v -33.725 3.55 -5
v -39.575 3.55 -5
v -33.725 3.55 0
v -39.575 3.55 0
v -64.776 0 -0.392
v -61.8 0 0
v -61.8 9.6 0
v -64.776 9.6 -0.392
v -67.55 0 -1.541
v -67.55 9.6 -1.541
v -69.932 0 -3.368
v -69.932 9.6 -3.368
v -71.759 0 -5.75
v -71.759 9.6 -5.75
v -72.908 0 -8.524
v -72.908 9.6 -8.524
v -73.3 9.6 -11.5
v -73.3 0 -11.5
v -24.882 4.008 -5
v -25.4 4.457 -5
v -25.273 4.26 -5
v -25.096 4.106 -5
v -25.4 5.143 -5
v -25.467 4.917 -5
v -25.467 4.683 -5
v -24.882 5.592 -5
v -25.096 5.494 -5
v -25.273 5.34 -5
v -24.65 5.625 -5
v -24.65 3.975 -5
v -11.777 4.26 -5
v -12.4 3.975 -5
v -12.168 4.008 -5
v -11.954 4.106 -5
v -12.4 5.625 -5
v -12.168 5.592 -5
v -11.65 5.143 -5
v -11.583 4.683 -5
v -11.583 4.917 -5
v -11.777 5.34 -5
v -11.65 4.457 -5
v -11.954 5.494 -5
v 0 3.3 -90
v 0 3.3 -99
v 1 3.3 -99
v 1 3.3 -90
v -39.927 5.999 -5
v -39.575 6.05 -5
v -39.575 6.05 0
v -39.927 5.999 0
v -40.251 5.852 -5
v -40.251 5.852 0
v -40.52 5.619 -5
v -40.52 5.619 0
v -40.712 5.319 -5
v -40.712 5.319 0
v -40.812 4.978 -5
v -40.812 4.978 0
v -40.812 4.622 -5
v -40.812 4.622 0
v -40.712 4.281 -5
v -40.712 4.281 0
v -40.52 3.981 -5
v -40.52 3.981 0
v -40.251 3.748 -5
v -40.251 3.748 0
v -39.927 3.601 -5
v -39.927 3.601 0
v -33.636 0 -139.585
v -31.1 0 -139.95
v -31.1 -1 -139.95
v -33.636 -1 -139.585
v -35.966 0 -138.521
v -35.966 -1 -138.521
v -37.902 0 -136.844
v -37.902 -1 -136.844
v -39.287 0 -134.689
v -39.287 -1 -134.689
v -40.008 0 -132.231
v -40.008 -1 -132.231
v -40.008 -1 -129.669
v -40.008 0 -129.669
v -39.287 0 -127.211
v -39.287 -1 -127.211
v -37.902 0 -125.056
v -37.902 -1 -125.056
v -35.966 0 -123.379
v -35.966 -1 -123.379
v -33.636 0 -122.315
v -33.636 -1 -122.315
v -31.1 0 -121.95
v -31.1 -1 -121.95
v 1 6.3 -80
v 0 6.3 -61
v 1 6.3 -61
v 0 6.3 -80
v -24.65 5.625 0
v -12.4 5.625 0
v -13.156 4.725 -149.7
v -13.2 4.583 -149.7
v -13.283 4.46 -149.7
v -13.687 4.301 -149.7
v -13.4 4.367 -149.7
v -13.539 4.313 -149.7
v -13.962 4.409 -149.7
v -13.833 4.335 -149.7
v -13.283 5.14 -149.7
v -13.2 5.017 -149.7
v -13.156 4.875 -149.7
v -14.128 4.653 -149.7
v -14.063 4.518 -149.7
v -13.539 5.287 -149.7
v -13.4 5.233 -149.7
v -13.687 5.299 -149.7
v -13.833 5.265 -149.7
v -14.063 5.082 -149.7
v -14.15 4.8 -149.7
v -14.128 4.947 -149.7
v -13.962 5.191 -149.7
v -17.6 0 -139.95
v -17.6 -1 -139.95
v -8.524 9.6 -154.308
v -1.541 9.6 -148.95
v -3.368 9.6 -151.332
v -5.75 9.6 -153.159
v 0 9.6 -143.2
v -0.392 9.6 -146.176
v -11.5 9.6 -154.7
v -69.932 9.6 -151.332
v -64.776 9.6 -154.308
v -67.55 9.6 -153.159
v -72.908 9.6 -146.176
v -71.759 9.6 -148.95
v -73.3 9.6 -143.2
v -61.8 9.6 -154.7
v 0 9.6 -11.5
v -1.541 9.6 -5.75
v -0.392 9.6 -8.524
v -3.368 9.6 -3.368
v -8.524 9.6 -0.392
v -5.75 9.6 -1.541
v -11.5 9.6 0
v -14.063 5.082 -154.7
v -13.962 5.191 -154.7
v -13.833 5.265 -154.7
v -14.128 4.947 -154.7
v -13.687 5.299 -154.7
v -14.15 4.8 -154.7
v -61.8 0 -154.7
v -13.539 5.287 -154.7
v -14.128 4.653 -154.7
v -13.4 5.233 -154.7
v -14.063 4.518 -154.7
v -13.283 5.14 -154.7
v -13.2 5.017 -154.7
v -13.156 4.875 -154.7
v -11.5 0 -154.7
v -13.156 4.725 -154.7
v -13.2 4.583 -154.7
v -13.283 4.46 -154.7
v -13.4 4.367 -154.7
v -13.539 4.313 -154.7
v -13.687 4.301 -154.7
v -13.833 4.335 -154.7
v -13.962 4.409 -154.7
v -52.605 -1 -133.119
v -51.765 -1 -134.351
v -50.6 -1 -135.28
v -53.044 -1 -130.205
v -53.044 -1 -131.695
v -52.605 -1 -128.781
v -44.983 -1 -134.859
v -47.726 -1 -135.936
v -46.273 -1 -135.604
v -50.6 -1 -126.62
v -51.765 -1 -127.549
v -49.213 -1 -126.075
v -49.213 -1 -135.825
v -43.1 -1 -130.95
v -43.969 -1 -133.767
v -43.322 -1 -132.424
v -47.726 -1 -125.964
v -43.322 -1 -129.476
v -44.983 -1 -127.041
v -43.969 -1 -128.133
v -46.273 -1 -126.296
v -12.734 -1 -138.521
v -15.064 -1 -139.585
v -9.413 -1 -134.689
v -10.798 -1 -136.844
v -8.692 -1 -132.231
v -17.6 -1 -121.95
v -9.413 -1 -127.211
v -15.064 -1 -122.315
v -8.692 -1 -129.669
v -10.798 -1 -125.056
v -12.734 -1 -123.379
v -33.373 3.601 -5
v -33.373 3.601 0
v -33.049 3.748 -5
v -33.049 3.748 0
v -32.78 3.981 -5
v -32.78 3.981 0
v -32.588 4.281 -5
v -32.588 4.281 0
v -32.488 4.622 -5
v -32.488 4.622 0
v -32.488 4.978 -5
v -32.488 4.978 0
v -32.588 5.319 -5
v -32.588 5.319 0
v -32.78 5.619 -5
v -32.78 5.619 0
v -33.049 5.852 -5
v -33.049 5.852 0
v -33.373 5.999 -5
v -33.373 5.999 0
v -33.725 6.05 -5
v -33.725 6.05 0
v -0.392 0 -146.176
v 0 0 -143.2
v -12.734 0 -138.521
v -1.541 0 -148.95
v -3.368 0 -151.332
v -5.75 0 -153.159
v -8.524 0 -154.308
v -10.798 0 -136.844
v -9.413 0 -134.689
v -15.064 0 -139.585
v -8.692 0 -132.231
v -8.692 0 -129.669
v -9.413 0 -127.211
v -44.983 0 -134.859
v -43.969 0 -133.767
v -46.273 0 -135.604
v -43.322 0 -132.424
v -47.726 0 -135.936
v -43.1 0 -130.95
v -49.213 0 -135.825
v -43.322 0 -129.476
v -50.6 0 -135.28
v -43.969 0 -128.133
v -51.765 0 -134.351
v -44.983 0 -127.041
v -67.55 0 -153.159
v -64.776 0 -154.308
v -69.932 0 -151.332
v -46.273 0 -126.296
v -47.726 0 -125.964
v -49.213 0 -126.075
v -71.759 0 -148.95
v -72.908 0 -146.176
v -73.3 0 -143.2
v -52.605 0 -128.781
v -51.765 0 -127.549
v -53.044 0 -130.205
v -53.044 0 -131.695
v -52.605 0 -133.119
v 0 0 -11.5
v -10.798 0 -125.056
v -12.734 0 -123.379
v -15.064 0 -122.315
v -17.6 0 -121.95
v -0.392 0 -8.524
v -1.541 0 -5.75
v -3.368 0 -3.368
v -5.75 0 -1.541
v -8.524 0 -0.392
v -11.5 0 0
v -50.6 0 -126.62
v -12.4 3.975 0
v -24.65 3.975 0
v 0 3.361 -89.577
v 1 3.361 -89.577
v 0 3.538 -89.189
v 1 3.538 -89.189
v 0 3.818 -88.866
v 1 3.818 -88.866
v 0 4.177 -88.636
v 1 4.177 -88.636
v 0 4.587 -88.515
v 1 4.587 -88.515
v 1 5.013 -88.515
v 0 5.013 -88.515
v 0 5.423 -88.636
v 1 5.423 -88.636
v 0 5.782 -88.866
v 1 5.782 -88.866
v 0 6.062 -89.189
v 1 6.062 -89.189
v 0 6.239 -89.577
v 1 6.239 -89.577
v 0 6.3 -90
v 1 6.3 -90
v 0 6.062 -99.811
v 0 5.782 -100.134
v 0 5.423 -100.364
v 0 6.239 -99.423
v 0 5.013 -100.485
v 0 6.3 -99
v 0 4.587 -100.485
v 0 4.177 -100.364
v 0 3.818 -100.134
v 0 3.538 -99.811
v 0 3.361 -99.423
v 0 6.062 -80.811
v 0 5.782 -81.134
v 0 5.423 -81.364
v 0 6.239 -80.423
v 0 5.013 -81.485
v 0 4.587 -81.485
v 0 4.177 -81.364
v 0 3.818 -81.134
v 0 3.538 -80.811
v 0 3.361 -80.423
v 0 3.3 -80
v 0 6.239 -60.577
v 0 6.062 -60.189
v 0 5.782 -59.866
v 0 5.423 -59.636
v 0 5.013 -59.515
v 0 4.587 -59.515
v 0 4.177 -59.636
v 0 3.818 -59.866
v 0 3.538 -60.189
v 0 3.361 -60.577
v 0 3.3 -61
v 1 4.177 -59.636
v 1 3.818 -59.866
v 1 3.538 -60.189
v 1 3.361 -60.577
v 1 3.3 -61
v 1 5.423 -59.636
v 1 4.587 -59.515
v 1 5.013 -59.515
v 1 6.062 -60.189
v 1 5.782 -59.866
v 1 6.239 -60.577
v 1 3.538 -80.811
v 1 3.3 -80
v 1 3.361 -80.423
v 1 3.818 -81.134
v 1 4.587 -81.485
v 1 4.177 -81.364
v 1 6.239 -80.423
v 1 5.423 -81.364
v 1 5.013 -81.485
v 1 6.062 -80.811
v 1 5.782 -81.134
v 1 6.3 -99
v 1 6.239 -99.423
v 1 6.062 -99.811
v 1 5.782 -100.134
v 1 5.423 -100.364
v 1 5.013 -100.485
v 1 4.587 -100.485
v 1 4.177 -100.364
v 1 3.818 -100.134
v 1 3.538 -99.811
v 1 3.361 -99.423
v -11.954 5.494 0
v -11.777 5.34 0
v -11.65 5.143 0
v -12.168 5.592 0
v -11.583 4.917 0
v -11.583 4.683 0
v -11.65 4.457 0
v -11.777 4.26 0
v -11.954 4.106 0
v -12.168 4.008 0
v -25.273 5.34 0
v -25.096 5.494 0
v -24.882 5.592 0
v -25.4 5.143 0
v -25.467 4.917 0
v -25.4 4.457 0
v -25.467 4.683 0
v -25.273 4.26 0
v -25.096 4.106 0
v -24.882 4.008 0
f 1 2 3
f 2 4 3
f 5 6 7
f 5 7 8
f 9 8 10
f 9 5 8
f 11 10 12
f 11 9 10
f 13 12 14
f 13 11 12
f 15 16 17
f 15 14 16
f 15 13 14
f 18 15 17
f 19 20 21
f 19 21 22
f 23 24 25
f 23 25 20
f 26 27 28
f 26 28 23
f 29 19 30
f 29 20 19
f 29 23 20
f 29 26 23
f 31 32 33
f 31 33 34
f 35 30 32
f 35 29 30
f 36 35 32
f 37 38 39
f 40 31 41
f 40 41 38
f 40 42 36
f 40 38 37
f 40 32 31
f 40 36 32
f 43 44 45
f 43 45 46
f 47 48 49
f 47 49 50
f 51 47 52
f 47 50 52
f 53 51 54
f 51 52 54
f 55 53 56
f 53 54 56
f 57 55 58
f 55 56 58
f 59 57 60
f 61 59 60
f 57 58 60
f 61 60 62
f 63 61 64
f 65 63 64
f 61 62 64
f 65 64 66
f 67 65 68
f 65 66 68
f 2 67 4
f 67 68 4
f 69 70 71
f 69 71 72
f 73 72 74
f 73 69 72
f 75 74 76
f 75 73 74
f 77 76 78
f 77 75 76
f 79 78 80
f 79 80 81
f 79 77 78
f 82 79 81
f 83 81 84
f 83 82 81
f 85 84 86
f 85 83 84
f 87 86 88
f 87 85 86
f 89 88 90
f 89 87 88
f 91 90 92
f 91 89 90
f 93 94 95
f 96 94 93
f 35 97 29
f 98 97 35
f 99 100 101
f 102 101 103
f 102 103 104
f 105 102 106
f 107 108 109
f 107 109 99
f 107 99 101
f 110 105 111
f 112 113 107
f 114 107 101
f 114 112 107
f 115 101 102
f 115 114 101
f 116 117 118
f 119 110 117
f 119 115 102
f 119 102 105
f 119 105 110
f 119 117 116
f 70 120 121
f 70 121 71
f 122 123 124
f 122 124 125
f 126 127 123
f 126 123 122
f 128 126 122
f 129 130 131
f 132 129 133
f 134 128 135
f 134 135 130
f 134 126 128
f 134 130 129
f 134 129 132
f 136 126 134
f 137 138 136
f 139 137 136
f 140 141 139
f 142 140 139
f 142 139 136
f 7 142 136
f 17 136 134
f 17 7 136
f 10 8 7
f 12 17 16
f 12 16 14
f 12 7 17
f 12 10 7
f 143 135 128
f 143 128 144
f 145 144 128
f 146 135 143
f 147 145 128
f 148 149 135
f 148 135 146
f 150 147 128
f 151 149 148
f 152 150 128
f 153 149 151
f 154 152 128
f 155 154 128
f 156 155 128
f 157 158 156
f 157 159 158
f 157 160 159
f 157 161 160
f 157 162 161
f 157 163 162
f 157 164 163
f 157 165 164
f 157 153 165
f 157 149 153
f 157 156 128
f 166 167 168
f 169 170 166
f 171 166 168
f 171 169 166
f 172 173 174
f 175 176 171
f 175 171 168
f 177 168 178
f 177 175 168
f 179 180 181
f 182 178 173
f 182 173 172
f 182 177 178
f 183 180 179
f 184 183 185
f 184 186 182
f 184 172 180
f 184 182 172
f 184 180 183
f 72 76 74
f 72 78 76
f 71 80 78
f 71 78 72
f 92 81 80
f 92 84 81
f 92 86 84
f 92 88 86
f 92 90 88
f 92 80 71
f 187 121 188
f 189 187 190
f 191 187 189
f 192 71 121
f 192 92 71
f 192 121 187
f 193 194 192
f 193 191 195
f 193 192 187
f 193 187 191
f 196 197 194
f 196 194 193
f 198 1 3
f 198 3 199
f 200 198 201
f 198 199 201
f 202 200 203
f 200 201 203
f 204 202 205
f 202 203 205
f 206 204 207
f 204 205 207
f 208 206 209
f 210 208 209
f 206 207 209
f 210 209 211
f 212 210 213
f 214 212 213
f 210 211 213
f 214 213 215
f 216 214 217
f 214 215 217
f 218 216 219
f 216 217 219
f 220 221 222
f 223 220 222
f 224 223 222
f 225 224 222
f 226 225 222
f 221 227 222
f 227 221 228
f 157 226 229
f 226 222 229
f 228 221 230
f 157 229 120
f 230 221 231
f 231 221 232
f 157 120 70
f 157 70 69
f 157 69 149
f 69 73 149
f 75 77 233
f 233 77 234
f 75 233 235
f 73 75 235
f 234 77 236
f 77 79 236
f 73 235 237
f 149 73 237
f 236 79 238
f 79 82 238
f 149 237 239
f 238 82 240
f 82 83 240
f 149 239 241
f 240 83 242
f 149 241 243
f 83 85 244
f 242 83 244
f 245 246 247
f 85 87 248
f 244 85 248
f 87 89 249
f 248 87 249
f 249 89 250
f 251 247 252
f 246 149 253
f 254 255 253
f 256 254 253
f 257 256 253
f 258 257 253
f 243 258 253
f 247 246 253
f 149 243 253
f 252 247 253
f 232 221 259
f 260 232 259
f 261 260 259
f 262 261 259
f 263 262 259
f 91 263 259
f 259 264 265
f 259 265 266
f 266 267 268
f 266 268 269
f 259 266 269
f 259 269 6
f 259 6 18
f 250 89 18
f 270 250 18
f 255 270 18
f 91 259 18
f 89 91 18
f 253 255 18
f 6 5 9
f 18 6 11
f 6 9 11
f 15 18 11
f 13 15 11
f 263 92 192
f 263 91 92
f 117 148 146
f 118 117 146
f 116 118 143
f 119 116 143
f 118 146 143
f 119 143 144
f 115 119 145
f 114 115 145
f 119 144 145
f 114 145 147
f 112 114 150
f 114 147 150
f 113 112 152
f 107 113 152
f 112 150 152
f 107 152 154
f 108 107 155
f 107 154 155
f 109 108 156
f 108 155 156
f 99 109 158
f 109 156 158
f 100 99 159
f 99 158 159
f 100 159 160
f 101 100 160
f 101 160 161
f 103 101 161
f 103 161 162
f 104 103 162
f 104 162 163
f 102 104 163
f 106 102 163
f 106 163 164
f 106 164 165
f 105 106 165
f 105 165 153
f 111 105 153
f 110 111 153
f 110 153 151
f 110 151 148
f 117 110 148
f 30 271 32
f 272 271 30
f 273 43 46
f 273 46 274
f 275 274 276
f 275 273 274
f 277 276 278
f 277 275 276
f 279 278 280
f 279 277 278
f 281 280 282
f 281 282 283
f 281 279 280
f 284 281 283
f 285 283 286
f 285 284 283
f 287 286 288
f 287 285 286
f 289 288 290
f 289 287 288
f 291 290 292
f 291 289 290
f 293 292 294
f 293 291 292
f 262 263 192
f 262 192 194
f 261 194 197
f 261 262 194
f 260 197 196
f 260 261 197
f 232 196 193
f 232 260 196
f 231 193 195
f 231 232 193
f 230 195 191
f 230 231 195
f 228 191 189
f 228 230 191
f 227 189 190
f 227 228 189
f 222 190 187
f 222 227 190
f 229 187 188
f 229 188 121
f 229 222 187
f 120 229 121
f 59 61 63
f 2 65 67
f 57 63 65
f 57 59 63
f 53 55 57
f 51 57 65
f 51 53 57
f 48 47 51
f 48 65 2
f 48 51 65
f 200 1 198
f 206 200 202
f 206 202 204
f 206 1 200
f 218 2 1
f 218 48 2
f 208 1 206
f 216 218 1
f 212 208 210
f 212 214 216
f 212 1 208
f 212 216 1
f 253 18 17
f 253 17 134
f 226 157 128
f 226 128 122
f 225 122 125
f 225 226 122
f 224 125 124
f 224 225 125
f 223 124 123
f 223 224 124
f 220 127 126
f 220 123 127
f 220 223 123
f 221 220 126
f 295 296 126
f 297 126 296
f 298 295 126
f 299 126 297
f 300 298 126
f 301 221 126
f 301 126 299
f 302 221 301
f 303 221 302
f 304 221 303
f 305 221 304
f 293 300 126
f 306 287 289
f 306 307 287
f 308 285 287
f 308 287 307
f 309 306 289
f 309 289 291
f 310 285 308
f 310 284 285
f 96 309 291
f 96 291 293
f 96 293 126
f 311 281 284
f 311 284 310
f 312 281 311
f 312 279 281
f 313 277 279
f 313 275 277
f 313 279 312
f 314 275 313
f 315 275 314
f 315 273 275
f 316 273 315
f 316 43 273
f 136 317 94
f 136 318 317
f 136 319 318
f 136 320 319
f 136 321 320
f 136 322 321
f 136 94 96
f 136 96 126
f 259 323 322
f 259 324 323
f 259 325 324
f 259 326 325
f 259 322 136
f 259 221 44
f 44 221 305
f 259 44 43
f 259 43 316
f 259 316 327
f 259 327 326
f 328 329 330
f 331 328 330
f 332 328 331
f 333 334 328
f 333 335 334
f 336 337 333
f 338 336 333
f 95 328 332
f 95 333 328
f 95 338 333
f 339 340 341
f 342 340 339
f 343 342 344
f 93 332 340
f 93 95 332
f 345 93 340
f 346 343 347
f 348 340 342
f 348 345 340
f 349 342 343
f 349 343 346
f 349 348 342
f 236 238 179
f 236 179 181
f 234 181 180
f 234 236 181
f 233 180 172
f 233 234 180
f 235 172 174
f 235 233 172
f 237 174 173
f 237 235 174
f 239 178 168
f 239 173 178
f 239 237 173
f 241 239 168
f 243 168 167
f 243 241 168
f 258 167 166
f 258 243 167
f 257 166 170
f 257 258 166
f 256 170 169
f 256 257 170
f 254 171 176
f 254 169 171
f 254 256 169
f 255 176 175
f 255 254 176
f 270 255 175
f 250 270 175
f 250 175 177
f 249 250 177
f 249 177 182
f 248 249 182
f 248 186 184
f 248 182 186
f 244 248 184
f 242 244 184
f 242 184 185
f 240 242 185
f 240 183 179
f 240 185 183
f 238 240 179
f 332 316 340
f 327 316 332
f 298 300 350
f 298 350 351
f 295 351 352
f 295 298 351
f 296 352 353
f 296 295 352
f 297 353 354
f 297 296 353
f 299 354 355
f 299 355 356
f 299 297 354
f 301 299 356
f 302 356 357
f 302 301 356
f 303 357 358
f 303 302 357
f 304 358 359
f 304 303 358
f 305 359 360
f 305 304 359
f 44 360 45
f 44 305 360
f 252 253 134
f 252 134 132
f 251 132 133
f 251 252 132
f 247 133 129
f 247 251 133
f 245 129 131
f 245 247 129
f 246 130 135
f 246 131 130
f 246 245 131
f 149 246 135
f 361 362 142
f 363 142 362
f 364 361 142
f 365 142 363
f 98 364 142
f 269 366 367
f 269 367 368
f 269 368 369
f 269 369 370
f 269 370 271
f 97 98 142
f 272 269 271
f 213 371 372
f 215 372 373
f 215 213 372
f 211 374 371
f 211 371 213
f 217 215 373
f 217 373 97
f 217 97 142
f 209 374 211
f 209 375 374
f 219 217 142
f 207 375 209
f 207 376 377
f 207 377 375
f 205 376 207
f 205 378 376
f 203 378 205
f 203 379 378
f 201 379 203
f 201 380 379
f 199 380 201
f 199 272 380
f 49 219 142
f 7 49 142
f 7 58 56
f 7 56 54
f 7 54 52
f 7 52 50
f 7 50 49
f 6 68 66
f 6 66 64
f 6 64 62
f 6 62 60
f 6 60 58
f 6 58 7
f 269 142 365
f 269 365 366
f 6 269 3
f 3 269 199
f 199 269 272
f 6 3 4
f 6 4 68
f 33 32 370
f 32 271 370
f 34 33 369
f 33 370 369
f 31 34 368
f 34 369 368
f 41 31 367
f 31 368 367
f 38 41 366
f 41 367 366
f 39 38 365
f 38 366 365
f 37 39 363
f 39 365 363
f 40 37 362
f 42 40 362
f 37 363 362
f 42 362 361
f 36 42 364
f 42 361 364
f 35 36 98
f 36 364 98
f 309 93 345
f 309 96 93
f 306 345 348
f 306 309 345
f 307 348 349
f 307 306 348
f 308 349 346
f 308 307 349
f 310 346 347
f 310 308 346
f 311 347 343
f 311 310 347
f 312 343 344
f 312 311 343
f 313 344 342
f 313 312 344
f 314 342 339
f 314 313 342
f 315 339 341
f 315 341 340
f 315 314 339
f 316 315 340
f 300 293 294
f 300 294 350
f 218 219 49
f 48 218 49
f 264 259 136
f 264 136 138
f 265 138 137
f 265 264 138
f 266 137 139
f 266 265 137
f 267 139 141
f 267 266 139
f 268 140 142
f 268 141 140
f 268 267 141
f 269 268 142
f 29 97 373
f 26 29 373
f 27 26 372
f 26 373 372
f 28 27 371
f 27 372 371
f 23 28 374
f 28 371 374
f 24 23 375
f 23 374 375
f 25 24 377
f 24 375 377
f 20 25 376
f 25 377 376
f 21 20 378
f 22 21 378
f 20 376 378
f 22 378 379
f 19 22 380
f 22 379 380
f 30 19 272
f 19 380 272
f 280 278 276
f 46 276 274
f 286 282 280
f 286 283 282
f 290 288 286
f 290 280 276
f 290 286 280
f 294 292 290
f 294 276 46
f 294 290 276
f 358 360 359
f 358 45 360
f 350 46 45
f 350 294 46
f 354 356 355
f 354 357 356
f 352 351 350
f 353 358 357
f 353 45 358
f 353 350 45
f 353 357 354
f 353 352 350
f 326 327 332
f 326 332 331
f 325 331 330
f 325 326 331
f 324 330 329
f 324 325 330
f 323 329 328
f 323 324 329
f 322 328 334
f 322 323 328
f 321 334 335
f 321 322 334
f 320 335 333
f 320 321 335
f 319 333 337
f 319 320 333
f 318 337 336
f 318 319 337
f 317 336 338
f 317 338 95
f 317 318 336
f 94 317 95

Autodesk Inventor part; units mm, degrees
ref_plane "YZ Plane" through (0, 0, 0) normal (1, 0, 0) x (0, 1, 0)
ref_plane "XZ Plane" through (0, 0, 0) normal (0, 1, 0) x (-1, 0, 0)
ref_plane "XY Plane" through (0, 0, 0) normal (0, 0, 1) x (1, 0, 0)
sketch "スケッチ1" plane through (0, 0, 0) normal (0, 1, 0) x (-1, 0, 0)
  line L0 (11.5, 0) -> (61.8, 0)
  line L1 (73.3, -11.5) -> (73.3, -143.2)
  line L2 (61.8, -154.7) -> (11.5, -154.7)
  line L3 (0, -143.2) -> (0, -11.5)
  arc A0 (73.3, -11.5) -> (61.8, 0) centre (61.8, -11.5) ccw
  arc A1 (11.5, 0) -> (0, -11.5) centre (11.5, -11.5) ccw
  arc A2 (0, -143.2) -> (11.5, -154.7) centre (11.5, -143.2) ccw
  arc A3 (61.8, -154.7) -> (73.3, -143.2) centre (61.8, -143.2) ccw
  point P0 (0, 0)
  point P1 (73.3, -154.7)
  point P2 (73.3, 0)
  point P3 (0, -154.7)
  dimension "d0" = 73.3
  dimension "d1" = 154.7
  dimension "d2" = 171.187
  dimension "d3" = 11.5
extrude "押し出し1" add sketch "スケッチ1" along normal blind 9.6
sketch "スケッチ2" plane through (-61.8, 0, 0) normal (0, 0, 1) x (1, 0, 0)
  line L0 (28.075, 6.05) -> (22.225, 6.05)
  line L1 (20.975, 4.8) -> (20.975, 4.8)
  line L2 (22.225, 3.55) -> (28.075, 3.55)
  line L3 (29.325, 4.8) -> (29.325, 4.8)
  line L4 (0, 9.6) -> (50.3, 9.6) projected
  line L5 (50.3, 0) -> (50.3, 9.6) projected
  arc A0 (22.225, 6.05) -> (20.975, 4.8) centre (22.225, 4.8) ccw
  arc A1 (20.975, 4.8) -> (22.225, 3.55) centre (22.225, 4.8) ccw
  arc A2 (28.075, 3.55) -> (29.325, 4.8) centre (28.075, 4.8) ccw
  arc A3 (29.325, 4.8) -> (28.075, 6.05) centre (28.075, 4.8) ccw
  line L6 (37.15, 5.625) -> (49.4, 5.625)
  line L7 (50.225, 4.8) -> (50.225, 4.8)
  line L8 (49.4, 3.975) -> (37.15, 3.975)
  line L9 (36.325, 4.8) -> (36.325, 4.8)
  arc A4 (50.225, 4.8) -> (49.4, 5.625) centre (49.4, 4.8) ccw
  arc A5 (49.4, 3.975) -> (50.225, 4.8) centre (49.4, 4.8) ccw
  arc A6 (37.15, 5.625) -> (36.325, 4.8) centre (37.15, 4.8) ccw
  arc A7 (36.325, 4.8) -> (37.15, 3.975) centre (37.15, 4.8) ccw
  point P0 (61.8, 0)
  point P1 (29.325, 6.05)
  point P2 (20.975, 3.55)
  point P3 (29.325, 3.55)
  point P4 (25.15, 6.05)
  point P5 (25.15, 9.6)
  point P6 (50.3, 4.8)
  point P7 (50.3, 4.8)
  point P8 (20.975, 4.8)
  point P9 (29.325, 4.8)
  point P10 (50.225, 3.975)
  point P11 (50.225, 5.625)
  point P12 (36.325, 3.975)
  point P13 (50.3, 4.8)
  point P14 (36.325, 4.8)
  point P15 (50.225, 4.8)
  dimension "d6" = 8.35
  dimension "d7" = 2.5
  dimension "d8" = 1.25
  dimension "d16" = 13.9
  dimension "d17" = 1.65
  dimension "d18" = 0.825
  dimension "d19" = 7
extrude "押し出し2" cut sketch "スケッチ2" against normal blind 5
sketch "スケッチ4" plane through (0, 0, -11.5) normal (1, 0, 0) x (0, 0, -1)
  line L0 (78.5, 6.3) -> (87.5, 6.3)
  line L1 (89, 4.8) -> (89, 4.8)
  line L2 (87.5, 3.3) -> (78.5, 3.3)
  line L3 (77, 4.8) -> (77, 4.8)
  line L4 (131.7, 0) -> (131.7, 9.6) projected
  arc A0 (78.5, 6.3) -> (77, 4.8) centre (78.5, 4.8) ccw
  arc A1 (77, 4.8) -> (78.5, 3.3) centre (78.5, 4.8) ccw
  arc A2 (87.5, 3.3) -> (89, 4.8) centre (87.5, 4.8) ccw
  arc A3 (89, 4.8) -> (87.5, 6.3) centre (87.5, 4.8) ccw
  line L5 (49.5, 6.3) -> (68.5, 6.3)
  line L6 (70, 4.8) -> (70, 4.8)
  line L7 (68.5, 3.3) -> (49.5, 3.3)
  line L8 (48, 4.8) -> (48, 4.8)
  arc A4 (49.5, 6.3) -> (48, 4.8) centre (49.5, 4.8) ccw
  arc A5 (48, 4.8) -> (49.5, 3.3) centre (49.5, 4.8) ccw
  arc A6 (70, 4.8) -> (68.5, 6.3) centre (68.5, 4.8) ccw
  arc A7 (68.5, 3.3) -> (70, 4.8) centre (68.5, 4.8) ccw
  point P0 (-11.5, 0)
  point P1 (89, 3.3)
  point P2 (89, 6.3)
  point P3 (77, 3.3)
  point P4 (89, 4.8)
  point P5 (131.7, 4.8)
  point P6 (70, 3.3)
  point P7 (70, 6.3)
  point P8 (48, 3.3)
  point P9 (48, 4.8)
  point P10 (70, 4.8)
  point P11 (77, 4.8)
  dimension "d20" = 12
  dimension "d21" = 3
  dimension "d22" = 42.7
  dimension "d23" = 1.5
  dimension "d24" = 22
  dimension "d25" = 7
  dimension "d26" = 3
  dimension "d27" = 1.5
extrude "押し出し3" add sketch "スケッチ4" along normal blind 1
sketch "スケッチ5" plane through (-11.5, 0, -154.7) normal (0, 0, -1) x (-1, 0, 0)
  circle A0 centre (2.15, 4.8) radius 0.5
  line L0 (0, 0) -> (0, 9.6) projected
  line L1 (0, 9.6) -> (50.3, 9.6) projected
  point P0 (-11.5, 0)
  point P1 (0, 4.8)
  point P2 (25.15, 9.6)
  dimension "d30" = 1
  dimension "d31" = 23
extrude "押し出し4" cut sketch "スケッチ5" against normal blind 5
sketch "スケッチ6" plane through (0, 0, 0) normal (0, -1, 0) x (1, 0, 0)
  line L0 (-17.6, -139.95) -> (-31.1, -139.95)
  line L1 (-40.1, -130.95) -> (-40.1, -130.95)
  line L2 (-31.1, -121.95) -> (-17.6, -121.95)
  line L3 (-8.6, -130.95) -> (-8.6, -130.95)
  line L4 (-11.5, -154.7) -> (-61.8, -154.7) projected
  line L5 (0, -11.5) -> (0, -143.2) projected
  arc A0 (-17.6, -139.95) -> (-8.6, -130.95) centre (-17.6, -130.95) ccw
  arc A1 (-8.6, -130.95) -> (-17.6, -121.95) centre (-17.6, -130.95) ccw
  arc A2 (-31.1, -121.95) -> (-40.1, -130.95) centre (-31.1, -130.95) ccw
  arc A3 (-40.1, -130.95) -> (-31.1, -139.95) centre (-31.1, -130.95) ccw
  circle A4 centre (-48.1, -130.95) radius 5
  point P0 (0, 0)
  point P1 (-40.1, -121.95)
  point P2 (-40.1, -139.95)
  point P3 (-8.6, -121.95)
  dimension "d34" = 31.5
  dimension "d35" = 18
  dimension "d36" = 14.75
  dimension "d37" = 8.6
  dimension "d38" = 9
  dimension "d41" = 10
  dimension "d43" = 8
extrude "押し出し5" add sketch "スケッチ6" along normal blind 1
properties part number "smartphone"
